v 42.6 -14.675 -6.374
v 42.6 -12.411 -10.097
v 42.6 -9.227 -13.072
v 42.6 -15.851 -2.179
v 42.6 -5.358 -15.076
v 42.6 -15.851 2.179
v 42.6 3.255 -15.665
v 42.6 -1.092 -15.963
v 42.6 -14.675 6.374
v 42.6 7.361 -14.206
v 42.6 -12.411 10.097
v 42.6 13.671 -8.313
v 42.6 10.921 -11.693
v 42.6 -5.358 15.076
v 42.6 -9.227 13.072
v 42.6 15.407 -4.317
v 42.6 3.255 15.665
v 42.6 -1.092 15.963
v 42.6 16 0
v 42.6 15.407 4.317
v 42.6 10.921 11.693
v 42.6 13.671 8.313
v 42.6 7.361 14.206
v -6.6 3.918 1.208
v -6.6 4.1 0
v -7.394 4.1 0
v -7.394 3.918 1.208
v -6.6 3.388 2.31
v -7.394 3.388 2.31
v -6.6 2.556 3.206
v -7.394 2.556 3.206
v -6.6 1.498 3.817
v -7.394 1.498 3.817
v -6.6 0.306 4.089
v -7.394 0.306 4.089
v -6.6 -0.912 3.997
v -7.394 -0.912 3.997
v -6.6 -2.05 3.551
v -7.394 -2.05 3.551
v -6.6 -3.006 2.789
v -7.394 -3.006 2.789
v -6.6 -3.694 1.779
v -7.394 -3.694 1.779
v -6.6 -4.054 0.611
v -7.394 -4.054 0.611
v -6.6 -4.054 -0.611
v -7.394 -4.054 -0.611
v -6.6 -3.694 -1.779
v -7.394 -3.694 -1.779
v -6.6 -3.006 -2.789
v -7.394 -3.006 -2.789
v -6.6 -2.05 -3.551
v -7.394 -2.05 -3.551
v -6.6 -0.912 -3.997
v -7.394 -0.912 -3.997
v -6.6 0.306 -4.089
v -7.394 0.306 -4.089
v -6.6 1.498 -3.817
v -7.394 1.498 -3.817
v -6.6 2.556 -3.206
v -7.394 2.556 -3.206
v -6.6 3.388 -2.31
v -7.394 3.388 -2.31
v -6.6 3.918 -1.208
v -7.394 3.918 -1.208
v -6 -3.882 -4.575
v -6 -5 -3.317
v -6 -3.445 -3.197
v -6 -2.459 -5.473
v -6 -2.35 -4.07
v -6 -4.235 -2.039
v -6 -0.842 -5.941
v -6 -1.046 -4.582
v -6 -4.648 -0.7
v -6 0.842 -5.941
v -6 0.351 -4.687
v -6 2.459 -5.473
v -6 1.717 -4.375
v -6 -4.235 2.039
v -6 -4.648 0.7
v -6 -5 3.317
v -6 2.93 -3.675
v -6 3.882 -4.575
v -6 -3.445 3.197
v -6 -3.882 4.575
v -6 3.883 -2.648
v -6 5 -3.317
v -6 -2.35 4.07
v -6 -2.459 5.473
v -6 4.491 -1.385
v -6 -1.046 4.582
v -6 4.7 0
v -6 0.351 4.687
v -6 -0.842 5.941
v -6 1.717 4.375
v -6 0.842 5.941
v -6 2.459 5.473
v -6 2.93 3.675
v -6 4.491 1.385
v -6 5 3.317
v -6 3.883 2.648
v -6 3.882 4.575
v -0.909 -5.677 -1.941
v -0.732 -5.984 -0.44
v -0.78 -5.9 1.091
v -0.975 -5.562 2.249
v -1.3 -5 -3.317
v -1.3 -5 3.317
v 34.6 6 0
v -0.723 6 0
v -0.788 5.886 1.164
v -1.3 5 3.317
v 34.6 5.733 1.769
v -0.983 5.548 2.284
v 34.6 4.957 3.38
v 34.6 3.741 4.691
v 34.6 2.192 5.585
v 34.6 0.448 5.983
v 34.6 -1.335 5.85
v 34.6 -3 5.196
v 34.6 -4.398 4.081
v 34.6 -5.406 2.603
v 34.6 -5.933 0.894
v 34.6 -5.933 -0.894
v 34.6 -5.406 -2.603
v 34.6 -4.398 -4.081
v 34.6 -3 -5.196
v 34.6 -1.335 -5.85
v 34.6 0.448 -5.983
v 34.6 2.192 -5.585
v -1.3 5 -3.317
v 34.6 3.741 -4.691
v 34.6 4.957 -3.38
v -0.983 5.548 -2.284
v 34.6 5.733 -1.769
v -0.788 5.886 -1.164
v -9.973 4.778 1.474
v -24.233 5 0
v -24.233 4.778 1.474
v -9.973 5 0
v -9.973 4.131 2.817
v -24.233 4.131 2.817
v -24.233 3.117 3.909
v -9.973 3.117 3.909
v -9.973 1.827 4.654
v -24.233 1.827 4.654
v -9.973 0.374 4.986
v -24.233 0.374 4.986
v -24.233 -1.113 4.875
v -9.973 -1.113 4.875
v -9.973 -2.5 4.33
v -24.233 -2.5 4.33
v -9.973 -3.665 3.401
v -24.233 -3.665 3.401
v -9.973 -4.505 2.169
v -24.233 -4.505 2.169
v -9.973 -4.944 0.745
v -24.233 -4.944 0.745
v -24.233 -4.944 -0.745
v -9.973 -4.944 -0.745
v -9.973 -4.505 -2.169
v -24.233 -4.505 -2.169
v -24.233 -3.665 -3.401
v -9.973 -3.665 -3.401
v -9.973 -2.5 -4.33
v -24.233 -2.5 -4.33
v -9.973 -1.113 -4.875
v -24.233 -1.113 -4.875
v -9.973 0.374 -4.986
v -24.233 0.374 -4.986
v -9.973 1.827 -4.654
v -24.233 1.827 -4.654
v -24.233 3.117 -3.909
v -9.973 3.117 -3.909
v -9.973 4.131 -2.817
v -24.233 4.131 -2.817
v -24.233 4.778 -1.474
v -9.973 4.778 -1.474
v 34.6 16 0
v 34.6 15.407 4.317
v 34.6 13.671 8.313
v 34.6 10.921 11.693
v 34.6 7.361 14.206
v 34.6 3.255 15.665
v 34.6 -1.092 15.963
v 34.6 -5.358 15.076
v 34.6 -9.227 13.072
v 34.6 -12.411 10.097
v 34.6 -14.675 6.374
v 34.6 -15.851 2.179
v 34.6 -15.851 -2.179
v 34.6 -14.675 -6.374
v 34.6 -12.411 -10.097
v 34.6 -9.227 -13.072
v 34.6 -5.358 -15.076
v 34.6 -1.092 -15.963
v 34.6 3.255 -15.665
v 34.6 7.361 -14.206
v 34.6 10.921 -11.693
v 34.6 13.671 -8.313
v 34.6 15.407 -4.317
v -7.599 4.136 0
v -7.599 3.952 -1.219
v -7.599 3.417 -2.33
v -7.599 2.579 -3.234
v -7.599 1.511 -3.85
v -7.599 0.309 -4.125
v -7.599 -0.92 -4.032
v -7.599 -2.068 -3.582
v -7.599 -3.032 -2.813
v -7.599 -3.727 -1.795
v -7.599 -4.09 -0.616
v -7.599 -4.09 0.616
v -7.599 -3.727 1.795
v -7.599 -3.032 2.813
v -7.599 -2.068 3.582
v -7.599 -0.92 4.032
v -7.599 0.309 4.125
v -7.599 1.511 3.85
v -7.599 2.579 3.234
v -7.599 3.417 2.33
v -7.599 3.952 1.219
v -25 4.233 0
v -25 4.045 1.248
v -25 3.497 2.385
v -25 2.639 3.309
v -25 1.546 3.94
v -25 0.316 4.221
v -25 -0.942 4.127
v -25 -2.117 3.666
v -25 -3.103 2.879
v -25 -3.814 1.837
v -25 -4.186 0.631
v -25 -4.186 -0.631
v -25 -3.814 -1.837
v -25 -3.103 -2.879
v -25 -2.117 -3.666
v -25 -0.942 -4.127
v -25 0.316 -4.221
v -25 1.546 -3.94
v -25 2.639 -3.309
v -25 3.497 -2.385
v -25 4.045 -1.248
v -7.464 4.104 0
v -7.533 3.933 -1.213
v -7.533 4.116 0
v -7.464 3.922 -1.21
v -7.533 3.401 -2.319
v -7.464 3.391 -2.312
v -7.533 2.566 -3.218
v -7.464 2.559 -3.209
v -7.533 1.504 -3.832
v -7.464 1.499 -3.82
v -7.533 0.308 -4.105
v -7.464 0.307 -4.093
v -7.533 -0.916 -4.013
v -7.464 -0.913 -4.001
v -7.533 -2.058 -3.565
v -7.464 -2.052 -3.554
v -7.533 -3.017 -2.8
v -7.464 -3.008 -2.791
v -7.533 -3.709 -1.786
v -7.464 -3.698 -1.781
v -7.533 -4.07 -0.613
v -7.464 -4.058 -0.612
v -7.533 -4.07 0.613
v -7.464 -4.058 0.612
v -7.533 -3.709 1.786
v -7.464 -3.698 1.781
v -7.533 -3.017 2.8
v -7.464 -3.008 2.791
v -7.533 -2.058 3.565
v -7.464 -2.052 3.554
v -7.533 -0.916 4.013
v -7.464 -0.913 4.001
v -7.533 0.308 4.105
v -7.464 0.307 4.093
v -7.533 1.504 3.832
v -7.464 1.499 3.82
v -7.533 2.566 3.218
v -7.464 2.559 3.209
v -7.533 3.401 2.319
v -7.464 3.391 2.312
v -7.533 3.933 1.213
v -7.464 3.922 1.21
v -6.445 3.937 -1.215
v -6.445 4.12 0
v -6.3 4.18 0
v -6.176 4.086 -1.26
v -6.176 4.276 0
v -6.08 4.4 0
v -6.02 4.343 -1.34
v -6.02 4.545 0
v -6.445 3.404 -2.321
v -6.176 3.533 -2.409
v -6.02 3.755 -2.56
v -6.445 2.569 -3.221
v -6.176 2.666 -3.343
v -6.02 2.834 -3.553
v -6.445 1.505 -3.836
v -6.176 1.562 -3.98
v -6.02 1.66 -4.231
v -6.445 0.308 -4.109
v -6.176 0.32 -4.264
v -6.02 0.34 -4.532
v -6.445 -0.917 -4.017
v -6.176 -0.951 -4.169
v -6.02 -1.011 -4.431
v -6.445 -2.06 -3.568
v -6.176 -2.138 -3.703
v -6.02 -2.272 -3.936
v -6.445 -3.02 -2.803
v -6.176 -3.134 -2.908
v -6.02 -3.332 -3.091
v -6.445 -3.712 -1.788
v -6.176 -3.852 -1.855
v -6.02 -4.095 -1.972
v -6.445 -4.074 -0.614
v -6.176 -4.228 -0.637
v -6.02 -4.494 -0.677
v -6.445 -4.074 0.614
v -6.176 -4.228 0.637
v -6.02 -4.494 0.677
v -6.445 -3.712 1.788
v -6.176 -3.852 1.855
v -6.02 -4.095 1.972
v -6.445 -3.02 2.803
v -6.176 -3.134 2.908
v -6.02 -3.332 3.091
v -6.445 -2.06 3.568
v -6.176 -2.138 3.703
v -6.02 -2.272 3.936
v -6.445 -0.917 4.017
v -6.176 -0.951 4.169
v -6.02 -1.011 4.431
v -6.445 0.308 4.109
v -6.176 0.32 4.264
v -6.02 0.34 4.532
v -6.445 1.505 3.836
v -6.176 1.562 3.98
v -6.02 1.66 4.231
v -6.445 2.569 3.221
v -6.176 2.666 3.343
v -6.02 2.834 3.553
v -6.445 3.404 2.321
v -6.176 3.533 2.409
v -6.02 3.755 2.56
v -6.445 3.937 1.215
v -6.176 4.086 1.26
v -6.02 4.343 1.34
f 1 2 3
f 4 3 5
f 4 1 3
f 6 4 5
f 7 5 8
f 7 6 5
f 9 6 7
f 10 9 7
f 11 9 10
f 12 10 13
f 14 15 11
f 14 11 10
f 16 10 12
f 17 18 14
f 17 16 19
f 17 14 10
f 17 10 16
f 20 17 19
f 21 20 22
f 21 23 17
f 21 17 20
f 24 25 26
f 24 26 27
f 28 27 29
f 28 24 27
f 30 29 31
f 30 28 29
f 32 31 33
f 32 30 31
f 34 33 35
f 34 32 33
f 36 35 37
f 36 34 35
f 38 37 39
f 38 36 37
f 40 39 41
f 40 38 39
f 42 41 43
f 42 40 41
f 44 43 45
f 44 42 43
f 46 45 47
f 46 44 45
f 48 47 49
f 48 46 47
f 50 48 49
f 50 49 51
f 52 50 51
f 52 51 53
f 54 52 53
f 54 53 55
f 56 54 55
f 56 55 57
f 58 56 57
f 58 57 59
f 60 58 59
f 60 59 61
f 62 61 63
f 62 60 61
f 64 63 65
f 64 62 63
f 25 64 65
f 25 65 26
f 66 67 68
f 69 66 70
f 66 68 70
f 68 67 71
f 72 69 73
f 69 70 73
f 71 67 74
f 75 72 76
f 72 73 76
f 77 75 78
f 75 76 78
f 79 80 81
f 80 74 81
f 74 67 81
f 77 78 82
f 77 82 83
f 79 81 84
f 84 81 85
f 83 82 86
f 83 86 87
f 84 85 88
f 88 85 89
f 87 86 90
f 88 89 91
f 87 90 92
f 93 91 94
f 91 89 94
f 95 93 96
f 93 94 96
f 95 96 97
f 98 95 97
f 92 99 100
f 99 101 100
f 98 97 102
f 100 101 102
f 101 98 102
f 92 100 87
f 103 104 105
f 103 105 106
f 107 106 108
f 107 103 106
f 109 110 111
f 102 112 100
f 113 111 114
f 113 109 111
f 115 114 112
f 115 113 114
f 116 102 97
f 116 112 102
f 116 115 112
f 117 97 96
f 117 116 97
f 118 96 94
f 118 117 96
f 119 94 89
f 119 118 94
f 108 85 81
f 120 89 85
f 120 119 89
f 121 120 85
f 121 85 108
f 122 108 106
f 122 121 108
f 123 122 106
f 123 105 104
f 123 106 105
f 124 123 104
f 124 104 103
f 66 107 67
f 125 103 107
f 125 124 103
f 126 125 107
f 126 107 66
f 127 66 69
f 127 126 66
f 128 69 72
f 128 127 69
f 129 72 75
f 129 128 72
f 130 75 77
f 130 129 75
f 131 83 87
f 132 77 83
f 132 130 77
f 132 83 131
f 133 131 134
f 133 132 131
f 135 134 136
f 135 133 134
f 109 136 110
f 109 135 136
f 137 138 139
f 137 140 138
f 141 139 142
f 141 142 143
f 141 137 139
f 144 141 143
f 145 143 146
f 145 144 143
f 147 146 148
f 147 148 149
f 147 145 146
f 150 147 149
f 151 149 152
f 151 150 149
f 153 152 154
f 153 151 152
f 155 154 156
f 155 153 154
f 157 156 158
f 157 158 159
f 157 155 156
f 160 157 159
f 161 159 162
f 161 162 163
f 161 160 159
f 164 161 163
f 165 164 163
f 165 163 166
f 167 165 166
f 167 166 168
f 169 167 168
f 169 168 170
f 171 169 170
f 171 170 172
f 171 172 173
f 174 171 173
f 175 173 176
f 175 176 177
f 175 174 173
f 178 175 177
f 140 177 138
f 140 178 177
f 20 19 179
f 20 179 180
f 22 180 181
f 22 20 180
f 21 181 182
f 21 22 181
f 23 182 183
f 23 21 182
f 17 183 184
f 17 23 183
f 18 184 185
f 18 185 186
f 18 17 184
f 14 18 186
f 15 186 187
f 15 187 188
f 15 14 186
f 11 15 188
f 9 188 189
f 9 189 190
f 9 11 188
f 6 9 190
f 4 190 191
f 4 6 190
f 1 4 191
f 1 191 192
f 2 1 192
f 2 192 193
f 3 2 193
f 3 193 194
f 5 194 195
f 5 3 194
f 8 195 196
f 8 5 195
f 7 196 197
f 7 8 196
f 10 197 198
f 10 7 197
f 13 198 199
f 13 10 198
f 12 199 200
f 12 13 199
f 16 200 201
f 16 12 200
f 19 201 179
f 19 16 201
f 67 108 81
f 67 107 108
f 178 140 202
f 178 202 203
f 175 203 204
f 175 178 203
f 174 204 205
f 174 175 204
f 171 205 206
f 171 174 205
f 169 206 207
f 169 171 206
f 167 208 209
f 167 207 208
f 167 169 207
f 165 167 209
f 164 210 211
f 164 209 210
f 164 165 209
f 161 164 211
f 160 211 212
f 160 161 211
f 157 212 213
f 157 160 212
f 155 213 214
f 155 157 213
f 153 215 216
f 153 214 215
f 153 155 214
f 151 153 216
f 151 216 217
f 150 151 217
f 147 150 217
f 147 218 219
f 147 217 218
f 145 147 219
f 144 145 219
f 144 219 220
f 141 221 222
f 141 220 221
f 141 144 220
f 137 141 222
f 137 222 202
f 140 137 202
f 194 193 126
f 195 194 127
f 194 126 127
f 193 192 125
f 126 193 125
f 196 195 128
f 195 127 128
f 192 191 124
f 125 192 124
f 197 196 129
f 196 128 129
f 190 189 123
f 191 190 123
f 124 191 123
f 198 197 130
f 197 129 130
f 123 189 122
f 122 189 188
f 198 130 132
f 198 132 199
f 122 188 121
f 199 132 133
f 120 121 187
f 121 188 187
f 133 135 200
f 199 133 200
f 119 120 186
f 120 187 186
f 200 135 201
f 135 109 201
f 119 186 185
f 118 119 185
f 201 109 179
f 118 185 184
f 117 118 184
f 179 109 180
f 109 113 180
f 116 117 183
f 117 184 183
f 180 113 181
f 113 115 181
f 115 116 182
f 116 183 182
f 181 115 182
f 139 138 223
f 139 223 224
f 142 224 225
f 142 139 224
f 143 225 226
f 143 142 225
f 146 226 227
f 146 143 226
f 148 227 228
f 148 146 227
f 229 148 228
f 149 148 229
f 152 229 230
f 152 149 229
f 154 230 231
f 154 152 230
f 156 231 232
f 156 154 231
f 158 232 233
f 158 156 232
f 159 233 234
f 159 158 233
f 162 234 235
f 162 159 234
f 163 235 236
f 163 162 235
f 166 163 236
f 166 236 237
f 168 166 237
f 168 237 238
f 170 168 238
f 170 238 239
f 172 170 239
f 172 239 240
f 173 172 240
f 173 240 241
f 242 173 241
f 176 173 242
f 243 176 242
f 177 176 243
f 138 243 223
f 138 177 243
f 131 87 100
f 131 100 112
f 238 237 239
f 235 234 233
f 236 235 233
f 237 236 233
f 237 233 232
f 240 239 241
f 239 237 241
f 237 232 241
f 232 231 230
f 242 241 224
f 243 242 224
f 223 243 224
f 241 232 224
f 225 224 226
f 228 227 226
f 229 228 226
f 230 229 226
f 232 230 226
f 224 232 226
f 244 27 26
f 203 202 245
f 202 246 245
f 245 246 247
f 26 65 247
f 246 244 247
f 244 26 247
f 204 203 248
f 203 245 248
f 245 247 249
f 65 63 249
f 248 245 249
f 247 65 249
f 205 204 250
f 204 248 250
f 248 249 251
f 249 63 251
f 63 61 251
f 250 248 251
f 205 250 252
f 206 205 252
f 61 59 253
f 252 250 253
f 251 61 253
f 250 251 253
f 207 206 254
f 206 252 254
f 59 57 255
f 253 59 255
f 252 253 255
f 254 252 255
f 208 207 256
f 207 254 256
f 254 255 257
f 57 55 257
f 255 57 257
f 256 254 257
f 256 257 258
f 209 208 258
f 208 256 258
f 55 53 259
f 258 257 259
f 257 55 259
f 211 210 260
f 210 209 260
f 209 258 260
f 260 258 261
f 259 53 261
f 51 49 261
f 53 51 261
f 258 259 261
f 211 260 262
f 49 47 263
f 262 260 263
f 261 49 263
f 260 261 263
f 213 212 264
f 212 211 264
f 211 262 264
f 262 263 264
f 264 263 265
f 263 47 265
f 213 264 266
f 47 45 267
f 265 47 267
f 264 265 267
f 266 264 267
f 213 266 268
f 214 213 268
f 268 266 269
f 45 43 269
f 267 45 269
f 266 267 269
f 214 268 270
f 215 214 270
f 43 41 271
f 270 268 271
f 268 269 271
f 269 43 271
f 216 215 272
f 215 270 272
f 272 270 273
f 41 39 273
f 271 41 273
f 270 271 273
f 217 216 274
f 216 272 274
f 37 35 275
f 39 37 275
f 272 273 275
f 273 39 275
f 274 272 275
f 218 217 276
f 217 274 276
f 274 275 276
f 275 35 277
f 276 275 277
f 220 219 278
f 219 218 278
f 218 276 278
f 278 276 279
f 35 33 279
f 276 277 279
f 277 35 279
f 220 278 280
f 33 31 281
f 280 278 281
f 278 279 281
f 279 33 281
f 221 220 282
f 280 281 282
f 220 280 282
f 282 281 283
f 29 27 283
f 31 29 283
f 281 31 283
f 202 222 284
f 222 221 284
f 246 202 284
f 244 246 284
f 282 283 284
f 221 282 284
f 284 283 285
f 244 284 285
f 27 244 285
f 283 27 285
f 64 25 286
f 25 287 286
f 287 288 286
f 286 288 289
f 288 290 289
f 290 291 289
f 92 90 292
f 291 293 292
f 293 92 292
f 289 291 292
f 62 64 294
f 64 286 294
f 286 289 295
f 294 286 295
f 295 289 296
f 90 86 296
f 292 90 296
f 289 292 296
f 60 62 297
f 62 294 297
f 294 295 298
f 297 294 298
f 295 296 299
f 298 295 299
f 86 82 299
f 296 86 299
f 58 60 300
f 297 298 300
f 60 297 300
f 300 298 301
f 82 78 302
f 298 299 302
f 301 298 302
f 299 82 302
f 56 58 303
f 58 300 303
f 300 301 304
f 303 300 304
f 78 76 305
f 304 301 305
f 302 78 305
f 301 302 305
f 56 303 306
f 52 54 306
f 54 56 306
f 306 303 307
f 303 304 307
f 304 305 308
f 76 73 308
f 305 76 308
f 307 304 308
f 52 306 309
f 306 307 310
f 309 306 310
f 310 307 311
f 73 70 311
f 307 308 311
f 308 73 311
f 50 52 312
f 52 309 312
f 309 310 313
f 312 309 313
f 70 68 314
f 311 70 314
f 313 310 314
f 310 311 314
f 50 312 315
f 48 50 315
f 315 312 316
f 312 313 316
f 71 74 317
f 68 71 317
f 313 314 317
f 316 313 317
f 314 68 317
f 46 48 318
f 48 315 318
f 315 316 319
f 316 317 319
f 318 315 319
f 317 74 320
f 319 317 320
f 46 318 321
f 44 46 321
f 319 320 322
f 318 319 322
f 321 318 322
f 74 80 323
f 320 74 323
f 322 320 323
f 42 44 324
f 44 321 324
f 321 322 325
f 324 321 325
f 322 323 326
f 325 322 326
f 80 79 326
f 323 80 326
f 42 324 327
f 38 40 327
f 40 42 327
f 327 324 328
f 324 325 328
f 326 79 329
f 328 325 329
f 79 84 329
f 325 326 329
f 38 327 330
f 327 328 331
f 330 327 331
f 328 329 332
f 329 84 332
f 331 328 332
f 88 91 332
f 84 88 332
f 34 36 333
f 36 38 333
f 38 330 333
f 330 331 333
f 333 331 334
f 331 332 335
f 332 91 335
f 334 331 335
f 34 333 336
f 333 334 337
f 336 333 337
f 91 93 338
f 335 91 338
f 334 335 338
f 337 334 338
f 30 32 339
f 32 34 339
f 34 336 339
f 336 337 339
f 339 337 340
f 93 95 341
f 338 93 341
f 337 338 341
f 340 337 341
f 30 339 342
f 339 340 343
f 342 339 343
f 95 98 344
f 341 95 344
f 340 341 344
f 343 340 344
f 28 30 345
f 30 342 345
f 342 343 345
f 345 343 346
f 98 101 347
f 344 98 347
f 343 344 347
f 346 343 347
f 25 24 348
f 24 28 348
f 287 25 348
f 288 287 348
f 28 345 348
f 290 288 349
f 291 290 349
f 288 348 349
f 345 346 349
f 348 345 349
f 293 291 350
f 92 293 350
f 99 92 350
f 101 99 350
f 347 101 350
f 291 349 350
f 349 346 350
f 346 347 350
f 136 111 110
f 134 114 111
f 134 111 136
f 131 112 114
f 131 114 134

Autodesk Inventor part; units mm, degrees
sketch "Sketch_1" plane through (0, 0, 0) normal (0, 0, 1) x (1, 0, 0)
  line L0 (42.6, 0) -> (-6, 0)
  line L1 (-6, 0) -> (-6, 6)
  line L2 (-6, 6) -> (42.6, 6)
  line L3 (42.6, 6) -> (42.6, 0)
  line L4 (42.6, 0) -> (-6, 0)
revolve "Revolution1" add sketch "Sketch_1" angle 360 about axis through (42.6, 0, 0) along (1, 0, 0)
sketch "Sketch_11" plane through (0, 0, 0) normal (0, 0, 1) x (1, 0, 0)
  line L0 (42.6, 0) -> (34.6, 0)
  line L1 (34.6, 0) -> (34.6, 16)
  line L2 (34.6, 16) -> (42.6, 16)
  line L3 (42.6, 16) -> (42.6, 0)
  line L4 (42.6, 0) -> (34.6, 0)
revolve "Revolution2" add sketch "Sketch_11" angle 360 about axis through (42.6, 0, 0) along (1, 0, 0)
sketch "Sketch_19" plane through (0, 0, 0) normal (0, 0, 1) x (1, 0, 0)
  line L0 (-5, 0) -> (-25, 0)
  line L1 (-25, 0) -> (-25, 4.233)
  line L2 (-25, 4.233) -> (-24.233, 5)
  line L3 (-24.233, 5) -> (-9.9727, 5)
  line L4 (-9.9727, 5) -> (-7.5994, 4.1362)
  arc A0 (-7.5994, 4.1362) -> (-7.3942, 4.1) centre (-7.3942, 4.7) ccw
  line L5 (-7.3942, 4.1) -> (-6.6, 4.1)
  arc A1 (-6.6, 4.1) -> (-6, 4.7) centre (-6.6, 4.7) ccw
  line L6 (-6, 4.7) -> (-6, 5)
  line L7 (-6, 5) -> (-5, 5)
  line L8 (-5, 5) -> (-5, 0)
  line L9 (-5, 0) -> (-25, 0)
revolve "Revolution3" add sketch "Sketch_19" angle 360 about axis through (-5, 0, 0) along (1, 0, 0)
thread "Thread1" size "M10x1.25" class "6g" standard "ISO Metric profile" full length
sketch "Sketch_20" plane through (0, 0, 0) normal (0, 0, 1) x (1, 0, 0)
  line L0 (-36, -16) -> (5.0509, -16)
  line L1 (5.0509, -16) -> (-1.3, -5)
  line L2 (-1.3, -5) -> (-6, -5)
  line L3 (-6, -5) -> (-6, -10)
  line L4 (-6, -10) -> (-30, -10)
  line L5 (-30, -10) -> (-30, 10)
  line L6 (-30, 10) -> (-6, 10)
  line L7 (-6, 10) -> (-6, 5)
  line L8 (-6, 5) -> (-1.3, 5)
  line L9 (-1.3, 5) -> (5.0509, 16)
  line L10 (5.0509, 16) -> (-36, 16)
  line L11 (-36, 16) -> (-36, -16)
extrude "Extrusion1" cut sketch "Sketch_20" along normal mid plane 24
ref_plane "FDT_PIRODACC_M1_XY" through (-15, 0, 0) normal (-1, 0, 0) x (0, 1, 0)
ref_plane "FDT_PIRODACC_M1_YZ" through (-15, 0, 0) normal (0, 1, 0) x (0, 0, -1)
ref_plane "FDT_PIRODACC_M1_ZX" through (-15, 0, 0) normal (0, 0, -1) x (-1, 0, 0)
ref_plane "NUT1_XY" through (-12.5, 0, 0) normal (1, 0, 0) x (0, 0, -1)
ref_plane "NUT1_YZ" through (-12.5, 0, 0) normal (0, 0, -1) x (0, 1, 0)
ref_plane "NUT1_ZX" through (-12.5, 0, 0) normal (0, 1, 0) x (1, 0, 0)
ref_plane "PISTON_XY" through (42.6, 0, 0) normal (1, 0, 0) x (0, 0, -1)
ref_plane "PISTON_YZ" through (42.6, 0, 0) normal (0, 0, -1) x (0, 1, 0)
ref_plane "PISTON_ZX" through (42.6, 0, 0) normal (0, 1, 0) x (1, 0, 0)
properties part number "536267 ADN-15-P-A_(KS)"
